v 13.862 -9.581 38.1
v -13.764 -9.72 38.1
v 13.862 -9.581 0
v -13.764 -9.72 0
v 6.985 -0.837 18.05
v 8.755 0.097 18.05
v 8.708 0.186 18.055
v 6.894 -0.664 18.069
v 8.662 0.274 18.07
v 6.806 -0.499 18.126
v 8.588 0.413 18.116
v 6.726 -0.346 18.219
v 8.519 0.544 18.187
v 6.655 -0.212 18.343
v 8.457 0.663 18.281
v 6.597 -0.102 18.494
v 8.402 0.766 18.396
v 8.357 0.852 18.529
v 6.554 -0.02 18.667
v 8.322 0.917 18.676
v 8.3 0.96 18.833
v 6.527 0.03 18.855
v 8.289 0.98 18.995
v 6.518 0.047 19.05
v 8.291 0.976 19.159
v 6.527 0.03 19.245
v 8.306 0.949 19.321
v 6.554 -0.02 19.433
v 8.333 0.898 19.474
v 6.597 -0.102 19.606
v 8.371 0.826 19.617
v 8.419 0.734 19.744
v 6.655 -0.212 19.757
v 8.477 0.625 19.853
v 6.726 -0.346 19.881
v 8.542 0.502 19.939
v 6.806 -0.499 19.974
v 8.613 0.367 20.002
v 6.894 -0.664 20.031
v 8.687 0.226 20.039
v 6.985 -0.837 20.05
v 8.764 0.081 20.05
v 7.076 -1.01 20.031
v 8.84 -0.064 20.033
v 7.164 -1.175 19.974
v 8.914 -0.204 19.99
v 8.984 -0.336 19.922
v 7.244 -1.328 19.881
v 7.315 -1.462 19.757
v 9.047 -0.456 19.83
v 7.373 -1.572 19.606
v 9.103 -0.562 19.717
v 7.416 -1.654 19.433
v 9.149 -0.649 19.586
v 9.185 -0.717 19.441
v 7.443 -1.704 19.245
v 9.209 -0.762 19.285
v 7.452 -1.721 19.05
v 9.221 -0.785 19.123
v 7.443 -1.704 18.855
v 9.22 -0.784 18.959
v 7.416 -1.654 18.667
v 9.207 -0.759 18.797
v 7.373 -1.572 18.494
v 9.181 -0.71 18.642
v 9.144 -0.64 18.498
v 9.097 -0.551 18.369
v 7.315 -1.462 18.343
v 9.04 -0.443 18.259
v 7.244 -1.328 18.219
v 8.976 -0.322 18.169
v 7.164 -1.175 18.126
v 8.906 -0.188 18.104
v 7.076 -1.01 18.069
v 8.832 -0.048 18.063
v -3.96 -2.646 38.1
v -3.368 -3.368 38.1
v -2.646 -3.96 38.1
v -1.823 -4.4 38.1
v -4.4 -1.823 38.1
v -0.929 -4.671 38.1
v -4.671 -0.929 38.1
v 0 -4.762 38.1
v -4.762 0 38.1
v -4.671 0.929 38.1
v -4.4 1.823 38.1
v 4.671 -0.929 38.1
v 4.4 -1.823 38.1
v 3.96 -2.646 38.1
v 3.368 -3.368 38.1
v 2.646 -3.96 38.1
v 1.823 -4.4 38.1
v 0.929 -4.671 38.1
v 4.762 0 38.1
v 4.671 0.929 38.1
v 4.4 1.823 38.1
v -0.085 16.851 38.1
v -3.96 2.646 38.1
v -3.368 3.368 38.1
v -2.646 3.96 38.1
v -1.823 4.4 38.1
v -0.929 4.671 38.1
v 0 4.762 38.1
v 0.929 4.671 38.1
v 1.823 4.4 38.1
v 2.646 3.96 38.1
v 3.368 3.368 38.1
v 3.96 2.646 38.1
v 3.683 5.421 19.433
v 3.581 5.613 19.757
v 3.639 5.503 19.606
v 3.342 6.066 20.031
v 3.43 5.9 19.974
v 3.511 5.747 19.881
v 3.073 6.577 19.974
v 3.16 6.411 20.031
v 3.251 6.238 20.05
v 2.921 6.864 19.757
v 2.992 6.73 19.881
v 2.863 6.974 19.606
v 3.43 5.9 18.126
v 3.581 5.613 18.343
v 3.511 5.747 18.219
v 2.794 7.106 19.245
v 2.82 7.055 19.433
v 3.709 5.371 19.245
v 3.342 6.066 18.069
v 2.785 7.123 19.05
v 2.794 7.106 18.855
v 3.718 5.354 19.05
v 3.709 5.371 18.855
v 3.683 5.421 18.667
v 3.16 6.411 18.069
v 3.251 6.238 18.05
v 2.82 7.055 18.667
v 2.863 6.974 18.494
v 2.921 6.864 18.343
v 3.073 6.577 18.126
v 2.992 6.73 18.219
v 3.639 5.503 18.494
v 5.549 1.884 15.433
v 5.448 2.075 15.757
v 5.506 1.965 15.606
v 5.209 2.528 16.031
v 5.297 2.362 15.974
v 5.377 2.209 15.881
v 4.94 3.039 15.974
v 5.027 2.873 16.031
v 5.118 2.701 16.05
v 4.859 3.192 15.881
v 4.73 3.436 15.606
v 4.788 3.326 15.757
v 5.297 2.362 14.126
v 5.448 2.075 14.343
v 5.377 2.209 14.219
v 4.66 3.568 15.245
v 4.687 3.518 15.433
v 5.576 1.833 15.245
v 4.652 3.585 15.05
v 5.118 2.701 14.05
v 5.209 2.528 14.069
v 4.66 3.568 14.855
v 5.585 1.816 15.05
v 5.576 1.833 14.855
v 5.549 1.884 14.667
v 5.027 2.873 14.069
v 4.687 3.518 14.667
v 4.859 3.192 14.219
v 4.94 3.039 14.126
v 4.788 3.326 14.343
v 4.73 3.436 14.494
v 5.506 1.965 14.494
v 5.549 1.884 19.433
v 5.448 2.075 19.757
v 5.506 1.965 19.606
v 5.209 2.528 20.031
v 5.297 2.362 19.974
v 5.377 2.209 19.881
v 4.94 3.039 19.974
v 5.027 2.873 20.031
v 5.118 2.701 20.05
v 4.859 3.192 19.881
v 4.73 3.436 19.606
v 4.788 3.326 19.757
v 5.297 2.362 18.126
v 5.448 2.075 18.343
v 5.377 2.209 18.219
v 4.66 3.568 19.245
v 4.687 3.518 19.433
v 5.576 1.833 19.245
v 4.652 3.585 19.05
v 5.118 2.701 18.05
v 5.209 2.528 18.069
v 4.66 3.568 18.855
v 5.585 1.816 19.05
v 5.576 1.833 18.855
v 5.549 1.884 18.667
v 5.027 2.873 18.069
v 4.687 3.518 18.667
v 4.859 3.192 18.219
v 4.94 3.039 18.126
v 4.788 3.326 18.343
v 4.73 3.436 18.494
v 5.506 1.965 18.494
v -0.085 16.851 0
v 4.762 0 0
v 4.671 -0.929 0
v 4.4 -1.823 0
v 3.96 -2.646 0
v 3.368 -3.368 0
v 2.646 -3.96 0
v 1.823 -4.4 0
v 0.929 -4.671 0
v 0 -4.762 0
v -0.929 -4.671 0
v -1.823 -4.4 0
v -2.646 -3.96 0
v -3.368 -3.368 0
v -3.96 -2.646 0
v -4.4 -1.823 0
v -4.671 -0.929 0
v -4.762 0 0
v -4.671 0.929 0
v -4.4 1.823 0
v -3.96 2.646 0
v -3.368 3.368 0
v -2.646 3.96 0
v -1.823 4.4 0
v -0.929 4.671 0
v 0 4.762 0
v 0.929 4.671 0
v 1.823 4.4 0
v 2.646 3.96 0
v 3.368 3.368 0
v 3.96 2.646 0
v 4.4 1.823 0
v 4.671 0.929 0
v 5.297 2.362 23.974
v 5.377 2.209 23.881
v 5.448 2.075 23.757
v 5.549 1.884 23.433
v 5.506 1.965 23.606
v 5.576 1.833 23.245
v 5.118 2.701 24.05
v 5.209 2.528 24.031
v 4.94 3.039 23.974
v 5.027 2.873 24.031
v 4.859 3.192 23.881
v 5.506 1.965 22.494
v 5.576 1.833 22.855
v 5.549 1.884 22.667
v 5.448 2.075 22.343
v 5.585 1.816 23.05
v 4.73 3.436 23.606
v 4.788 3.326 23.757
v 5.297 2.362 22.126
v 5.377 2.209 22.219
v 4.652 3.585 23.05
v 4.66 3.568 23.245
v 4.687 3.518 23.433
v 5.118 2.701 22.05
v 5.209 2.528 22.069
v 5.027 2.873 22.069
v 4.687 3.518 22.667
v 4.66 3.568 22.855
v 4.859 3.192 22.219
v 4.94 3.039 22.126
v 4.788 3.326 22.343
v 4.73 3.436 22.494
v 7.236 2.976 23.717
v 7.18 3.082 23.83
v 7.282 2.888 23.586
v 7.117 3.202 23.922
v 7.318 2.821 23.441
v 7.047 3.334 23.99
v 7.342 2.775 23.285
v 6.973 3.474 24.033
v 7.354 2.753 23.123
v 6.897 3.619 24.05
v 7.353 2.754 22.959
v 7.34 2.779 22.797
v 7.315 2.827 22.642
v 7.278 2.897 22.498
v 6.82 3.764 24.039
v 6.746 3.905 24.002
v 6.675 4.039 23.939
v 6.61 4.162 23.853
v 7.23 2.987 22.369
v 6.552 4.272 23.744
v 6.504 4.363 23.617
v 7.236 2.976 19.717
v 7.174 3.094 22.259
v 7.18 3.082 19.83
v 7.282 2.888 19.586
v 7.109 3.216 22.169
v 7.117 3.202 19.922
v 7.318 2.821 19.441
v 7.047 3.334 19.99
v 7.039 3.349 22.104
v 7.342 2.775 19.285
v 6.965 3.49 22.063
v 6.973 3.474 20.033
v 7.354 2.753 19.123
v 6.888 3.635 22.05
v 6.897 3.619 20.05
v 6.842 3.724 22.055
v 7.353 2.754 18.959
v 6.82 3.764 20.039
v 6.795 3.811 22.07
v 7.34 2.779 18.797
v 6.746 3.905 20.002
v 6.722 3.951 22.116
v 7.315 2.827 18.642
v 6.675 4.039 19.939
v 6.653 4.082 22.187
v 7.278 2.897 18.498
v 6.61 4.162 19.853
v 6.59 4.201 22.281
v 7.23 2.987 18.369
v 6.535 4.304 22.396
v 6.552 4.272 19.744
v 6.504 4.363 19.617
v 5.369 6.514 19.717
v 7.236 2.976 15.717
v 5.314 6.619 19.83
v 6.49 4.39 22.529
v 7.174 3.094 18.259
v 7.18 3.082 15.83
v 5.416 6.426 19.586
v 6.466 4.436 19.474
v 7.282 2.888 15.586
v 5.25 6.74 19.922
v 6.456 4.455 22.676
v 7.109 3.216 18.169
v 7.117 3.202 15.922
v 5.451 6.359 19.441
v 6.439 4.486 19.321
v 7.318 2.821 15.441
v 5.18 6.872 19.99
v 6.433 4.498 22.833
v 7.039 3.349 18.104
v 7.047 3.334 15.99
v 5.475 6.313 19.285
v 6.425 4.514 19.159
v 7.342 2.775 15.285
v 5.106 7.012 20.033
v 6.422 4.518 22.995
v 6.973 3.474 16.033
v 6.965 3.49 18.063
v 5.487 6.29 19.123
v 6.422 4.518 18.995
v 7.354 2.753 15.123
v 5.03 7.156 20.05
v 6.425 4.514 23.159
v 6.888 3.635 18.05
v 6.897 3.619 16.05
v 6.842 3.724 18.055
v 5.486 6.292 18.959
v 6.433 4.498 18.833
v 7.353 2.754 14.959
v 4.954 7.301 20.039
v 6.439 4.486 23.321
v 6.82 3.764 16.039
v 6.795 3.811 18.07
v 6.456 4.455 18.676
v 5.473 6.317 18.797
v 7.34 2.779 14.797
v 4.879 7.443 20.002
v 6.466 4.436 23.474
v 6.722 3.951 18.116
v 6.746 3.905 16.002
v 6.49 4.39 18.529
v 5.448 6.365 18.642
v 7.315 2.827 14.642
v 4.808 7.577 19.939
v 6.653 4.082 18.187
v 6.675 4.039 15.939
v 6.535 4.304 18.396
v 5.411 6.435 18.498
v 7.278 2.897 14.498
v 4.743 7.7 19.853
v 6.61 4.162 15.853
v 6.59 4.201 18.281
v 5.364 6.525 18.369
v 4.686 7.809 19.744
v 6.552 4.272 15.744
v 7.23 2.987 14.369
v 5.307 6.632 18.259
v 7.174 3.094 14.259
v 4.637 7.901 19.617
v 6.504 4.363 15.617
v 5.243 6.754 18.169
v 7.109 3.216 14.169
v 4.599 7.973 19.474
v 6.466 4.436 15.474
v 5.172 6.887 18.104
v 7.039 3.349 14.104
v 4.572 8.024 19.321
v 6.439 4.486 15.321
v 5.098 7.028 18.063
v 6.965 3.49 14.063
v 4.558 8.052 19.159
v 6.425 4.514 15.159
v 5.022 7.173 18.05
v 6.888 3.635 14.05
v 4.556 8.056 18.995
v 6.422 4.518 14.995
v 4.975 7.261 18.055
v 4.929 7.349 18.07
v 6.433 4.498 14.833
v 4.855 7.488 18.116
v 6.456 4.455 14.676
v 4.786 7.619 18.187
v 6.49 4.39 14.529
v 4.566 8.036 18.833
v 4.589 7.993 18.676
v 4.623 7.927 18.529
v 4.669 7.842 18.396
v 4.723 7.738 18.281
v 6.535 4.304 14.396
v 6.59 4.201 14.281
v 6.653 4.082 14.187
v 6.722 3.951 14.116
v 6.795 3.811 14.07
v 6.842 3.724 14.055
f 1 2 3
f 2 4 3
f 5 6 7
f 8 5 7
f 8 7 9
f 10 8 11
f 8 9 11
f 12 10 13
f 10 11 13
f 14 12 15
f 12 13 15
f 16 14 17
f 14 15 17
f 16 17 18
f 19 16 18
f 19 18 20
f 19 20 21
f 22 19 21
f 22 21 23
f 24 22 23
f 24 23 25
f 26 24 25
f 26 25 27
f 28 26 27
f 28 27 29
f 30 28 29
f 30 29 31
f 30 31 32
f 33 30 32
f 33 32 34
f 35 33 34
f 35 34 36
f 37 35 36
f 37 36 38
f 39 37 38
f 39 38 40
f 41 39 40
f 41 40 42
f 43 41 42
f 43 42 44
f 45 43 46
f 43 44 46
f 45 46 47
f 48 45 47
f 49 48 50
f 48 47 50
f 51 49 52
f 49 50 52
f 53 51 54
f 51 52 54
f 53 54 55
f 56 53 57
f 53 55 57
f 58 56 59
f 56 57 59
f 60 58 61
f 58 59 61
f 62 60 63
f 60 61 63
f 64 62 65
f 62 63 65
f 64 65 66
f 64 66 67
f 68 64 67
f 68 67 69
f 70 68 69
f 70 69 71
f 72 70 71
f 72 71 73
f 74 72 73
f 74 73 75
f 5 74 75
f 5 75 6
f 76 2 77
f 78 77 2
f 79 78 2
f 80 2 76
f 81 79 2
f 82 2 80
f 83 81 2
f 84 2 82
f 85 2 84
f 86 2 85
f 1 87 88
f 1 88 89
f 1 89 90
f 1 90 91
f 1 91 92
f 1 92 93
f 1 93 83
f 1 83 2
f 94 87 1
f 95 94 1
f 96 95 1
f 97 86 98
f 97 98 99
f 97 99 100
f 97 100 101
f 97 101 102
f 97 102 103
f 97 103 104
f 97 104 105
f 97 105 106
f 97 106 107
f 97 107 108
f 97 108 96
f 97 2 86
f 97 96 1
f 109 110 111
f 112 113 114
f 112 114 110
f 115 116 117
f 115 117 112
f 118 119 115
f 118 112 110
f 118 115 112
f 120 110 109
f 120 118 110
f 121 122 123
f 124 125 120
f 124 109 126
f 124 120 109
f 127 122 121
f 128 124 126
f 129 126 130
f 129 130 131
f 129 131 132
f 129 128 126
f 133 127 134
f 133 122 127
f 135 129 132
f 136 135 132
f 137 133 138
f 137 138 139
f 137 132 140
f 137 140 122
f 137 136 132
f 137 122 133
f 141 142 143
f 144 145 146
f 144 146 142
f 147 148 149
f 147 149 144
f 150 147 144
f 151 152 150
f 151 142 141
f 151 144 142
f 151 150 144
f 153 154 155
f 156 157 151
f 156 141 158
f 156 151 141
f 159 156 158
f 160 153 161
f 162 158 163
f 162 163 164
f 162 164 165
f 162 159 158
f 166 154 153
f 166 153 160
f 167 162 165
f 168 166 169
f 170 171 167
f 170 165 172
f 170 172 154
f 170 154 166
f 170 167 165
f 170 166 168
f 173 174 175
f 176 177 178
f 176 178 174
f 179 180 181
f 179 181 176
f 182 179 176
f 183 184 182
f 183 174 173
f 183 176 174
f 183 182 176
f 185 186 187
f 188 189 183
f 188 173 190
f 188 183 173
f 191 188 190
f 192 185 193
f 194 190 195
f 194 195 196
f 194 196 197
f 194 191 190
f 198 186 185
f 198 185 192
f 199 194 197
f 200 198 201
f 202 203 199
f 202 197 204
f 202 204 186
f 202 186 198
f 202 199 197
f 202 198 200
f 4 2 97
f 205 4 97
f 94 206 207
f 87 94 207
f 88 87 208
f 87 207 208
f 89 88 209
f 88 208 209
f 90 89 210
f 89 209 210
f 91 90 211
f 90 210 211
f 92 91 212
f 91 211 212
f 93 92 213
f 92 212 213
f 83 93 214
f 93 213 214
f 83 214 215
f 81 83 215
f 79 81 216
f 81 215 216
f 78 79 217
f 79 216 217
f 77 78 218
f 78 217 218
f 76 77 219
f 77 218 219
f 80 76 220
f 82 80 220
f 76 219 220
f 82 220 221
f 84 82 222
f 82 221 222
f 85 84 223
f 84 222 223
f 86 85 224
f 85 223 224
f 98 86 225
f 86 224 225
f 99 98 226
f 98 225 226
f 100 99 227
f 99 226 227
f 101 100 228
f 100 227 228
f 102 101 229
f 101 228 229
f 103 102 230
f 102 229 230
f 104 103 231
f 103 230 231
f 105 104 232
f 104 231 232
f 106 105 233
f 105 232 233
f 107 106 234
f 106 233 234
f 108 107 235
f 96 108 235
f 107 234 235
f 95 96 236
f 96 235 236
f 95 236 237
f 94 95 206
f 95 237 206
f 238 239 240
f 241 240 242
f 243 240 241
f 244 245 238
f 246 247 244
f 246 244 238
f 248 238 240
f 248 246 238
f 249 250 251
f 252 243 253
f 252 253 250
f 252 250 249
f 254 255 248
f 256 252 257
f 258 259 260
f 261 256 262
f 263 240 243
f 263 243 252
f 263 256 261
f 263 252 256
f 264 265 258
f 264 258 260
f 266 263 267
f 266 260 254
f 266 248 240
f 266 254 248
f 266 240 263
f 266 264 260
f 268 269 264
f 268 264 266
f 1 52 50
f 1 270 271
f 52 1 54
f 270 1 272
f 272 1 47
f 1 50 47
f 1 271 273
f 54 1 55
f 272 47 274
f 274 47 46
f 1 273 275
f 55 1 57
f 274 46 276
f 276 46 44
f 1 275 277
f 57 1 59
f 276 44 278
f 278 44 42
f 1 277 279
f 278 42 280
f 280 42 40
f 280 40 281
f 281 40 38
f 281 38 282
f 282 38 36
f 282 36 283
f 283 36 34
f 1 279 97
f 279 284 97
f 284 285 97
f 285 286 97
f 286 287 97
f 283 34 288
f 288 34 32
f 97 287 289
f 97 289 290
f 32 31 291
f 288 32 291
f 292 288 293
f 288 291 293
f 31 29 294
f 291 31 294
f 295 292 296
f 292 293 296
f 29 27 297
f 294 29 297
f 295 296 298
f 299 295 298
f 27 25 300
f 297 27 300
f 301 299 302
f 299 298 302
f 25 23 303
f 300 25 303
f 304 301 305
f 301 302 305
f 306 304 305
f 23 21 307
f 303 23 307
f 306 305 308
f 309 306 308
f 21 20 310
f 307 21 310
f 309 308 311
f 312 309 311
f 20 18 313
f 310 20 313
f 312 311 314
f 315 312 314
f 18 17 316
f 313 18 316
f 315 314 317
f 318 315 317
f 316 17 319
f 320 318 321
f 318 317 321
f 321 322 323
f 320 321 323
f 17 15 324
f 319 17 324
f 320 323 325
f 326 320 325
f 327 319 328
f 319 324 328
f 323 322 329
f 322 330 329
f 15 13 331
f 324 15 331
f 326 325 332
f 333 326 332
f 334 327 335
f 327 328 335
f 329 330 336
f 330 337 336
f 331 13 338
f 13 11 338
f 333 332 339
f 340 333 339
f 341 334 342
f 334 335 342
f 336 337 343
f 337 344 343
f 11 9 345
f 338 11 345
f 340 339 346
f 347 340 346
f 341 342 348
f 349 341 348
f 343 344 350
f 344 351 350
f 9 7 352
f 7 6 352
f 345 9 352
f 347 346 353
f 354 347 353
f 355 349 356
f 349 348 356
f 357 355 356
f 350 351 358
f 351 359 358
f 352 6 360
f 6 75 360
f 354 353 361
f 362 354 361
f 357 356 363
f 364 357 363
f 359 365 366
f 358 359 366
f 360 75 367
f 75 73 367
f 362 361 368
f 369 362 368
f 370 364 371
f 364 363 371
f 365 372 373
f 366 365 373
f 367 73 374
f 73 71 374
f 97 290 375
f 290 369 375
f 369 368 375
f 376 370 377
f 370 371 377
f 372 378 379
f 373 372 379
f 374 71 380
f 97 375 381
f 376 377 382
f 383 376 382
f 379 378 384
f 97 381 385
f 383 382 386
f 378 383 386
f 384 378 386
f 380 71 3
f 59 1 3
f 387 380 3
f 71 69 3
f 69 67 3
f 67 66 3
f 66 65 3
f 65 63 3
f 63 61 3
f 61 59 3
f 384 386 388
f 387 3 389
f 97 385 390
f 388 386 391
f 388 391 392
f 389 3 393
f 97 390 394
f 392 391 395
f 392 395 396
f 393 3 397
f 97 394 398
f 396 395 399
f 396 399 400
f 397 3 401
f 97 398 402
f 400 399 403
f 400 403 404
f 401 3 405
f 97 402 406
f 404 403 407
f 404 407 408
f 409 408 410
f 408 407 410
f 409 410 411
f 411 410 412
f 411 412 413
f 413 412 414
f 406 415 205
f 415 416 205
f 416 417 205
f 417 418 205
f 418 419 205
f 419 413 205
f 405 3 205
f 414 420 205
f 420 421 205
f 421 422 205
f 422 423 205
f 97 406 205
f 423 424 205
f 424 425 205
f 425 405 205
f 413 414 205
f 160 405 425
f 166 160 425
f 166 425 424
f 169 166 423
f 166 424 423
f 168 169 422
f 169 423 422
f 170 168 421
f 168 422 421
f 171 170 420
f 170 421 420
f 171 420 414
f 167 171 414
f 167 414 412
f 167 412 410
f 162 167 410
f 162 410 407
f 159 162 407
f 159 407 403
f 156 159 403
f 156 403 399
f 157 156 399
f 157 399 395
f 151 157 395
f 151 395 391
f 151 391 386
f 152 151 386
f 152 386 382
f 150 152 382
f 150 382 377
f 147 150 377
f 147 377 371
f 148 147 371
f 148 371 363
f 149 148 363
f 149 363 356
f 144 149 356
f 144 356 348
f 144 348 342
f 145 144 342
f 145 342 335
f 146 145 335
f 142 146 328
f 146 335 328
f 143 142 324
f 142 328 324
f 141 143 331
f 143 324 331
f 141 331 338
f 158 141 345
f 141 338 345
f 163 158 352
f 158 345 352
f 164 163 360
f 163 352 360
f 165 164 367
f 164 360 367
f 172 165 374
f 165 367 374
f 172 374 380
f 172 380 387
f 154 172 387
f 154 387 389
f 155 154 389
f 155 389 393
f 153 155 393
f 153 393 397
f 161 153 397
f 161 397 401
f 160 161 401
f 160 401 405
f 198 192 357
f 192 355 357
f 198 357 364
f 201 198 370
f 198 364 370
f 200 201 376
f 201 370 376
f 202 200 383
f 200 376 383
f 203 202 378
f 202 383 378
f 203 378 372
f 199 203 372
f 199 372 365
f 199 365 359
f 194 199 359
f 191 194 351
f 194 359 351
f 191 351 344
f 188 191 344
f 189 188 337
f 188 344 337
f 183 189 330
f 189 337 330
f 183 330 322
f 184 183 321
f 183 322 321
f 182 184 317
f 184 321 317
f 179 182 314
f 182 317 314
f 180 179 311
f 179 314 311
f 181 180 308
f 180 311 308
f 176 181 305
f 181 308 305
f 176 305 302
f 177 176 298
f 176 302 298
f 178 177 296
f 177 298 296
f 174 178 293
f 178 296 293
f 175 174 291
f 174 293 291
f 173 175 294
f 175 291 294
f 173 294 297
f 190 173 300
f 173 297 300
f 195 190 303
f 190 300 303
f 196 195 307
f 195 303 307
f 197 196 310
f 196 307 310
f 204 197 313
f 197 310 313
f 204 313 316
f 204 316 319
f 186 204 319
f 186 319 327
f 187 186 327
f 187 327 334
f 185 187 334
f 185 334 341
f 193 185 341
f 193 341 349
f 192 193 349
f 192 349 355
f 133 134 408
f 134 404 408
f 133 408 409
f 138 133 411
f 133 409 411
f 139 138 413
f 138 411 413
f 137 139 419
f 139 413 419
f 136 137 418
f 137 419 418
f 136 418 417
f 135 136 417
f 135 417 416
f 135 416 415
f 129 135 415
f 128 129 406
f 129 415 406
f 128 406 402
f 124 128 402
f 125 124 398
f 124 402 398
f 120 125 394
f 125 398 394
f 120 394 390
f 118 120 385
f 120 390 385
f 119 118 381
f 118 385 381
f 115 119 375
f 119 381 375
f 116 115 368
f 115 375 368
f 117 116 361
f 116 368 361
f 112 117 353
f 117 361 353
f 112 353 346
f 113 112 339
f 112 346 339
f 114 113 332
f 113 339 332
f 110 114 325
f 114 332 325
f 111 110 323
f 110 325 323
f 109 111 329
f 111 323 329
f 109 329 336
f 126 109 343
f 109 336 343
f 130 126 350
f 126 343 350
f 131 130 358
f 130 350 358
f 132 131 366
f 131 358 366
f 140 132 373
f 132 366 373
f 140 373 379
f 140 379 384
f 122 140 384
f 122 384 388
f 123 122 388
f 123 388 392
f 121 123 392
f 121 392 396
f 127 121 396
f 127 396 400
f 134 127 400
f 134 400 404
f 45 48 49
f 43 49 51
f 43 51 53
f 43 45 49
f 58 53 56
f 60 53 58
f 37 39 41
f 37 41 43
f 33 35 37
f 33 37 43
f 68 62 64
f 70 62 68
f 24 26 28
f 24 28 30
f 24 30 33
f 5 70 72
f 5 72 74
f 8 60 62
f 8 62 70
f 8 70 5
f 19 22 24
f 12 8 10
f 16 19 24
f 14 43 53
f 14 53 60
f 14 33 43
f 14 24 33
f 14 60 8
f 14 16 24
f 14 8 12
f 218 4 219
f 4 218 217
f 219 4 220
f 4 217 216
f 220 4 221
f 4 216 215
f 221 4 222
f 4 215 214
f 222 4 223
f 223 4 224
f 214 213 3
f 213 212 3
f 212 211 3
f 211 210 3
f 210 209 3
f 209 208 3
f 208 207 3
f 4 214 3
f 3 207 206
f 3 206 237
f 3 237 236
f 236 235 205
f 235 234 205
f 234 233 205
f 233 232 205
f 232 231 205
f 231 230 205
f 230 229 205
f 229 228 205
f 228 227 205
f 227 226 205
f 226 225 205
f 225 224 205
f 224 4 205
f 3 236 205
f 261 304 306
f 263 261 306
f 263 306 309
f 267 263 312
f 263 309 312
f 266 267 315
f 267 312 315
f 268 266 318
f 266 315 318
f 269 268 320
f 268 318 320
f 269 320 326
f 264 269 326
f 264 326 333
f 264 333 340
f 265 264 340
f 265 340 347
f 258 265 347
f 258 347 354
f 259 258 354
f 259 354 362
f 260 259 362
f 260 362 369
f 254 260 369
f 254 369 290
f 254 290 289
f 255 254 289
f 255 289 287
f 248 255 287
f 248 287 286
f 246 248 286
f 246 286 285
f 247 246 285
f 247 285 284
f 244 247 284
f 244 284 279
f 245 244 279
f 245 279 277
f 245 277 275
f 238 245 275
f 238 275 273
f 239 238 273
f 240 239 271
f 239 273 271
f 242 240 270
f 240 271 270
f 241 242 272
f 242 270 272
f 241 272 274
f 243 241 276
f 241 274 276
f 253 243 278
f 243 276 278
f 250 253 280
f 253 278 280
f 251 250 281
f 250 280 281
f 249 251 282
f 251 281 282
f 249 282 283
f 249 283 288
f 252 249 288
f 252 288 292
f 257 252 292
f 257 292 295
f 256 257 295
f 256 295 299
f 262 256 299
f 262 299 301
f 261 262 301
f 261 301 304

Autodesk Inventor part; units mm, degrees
ref_plane "YZ Plane" through (0, 0, 0) normal (1, 0, 0) x (0, 1, 0)
ref_plane "XZ Plane" through (0, 0, 0) normal (0, 1, 0) x (-1, 0, 0)
ref_plane "XY Plane" through (0, 0, 0) normal (0, 0, 1) x (1, 0, 0)
sketch "Sketch1" plane through (0, 0, 0) normal (0, 0, 1) x (1, 0, 0)
  circle A0 centre (0, 0) radius 4.7625
  line L0 (0, 0) -> (-0.0721, 14.2871)
  circle A1 centre (0, 0) radius 16.8508
  line L1 (-13.7645, -9.7205) -> (13.862, -9.581)
  line L2 (-13.7645, -9.7205) -> (-0.0851, 16.8506)
  line L3 (13.862, -9.581) -> (-0.0851, 16.8506)
  dimension "d0" = 9.525
extrude "Extrusion1" add sketch "Sketch1" along normal blind 38.1 contours L3 L1 L2
sketch "Sketch2" plane through (-0.0851, 16.8506, 38.1) normal (0.8844, 0.4667, 0) x (0, 0, -1)
  circle A0 centre (19.05, -14.9428) radius 1
  circle A1 centre (19.05, -10.9428) radius 1
  circle A2 centre (19.05, -18.9428) radius 1
  circle A3 centre (23.05, -14.9428) radius 1
  circle A4 centre (15.05, -14.9428) radius 1
  point P0 (38.1, -14.9428)
  dimension "d6" = 2
  dimension "d8" = 2
  dimension "d10" = 2
  dimension "d12" = 2
  dimension "d14" = 2
extrude "Extrusion2" cut sketch "Sketch2" against normal blind 2
sketch "Sketch3" plane through (0, 0, 38.1) normal (0, 0, 1) x (1, 0, 0)
  circle A0 centre (0, 0) radius 4.7625 projected
  line L0 (-13.7645, -9.7205) -> (13.862, -9.581) projected
  line L1 (13.862, -9.581) -> (-0.0851, 16.8506) projected
  line L2 (-0.0851, 16.8506) -> (-13.7645, -9.7205) projected
properties part number "Triangle"
